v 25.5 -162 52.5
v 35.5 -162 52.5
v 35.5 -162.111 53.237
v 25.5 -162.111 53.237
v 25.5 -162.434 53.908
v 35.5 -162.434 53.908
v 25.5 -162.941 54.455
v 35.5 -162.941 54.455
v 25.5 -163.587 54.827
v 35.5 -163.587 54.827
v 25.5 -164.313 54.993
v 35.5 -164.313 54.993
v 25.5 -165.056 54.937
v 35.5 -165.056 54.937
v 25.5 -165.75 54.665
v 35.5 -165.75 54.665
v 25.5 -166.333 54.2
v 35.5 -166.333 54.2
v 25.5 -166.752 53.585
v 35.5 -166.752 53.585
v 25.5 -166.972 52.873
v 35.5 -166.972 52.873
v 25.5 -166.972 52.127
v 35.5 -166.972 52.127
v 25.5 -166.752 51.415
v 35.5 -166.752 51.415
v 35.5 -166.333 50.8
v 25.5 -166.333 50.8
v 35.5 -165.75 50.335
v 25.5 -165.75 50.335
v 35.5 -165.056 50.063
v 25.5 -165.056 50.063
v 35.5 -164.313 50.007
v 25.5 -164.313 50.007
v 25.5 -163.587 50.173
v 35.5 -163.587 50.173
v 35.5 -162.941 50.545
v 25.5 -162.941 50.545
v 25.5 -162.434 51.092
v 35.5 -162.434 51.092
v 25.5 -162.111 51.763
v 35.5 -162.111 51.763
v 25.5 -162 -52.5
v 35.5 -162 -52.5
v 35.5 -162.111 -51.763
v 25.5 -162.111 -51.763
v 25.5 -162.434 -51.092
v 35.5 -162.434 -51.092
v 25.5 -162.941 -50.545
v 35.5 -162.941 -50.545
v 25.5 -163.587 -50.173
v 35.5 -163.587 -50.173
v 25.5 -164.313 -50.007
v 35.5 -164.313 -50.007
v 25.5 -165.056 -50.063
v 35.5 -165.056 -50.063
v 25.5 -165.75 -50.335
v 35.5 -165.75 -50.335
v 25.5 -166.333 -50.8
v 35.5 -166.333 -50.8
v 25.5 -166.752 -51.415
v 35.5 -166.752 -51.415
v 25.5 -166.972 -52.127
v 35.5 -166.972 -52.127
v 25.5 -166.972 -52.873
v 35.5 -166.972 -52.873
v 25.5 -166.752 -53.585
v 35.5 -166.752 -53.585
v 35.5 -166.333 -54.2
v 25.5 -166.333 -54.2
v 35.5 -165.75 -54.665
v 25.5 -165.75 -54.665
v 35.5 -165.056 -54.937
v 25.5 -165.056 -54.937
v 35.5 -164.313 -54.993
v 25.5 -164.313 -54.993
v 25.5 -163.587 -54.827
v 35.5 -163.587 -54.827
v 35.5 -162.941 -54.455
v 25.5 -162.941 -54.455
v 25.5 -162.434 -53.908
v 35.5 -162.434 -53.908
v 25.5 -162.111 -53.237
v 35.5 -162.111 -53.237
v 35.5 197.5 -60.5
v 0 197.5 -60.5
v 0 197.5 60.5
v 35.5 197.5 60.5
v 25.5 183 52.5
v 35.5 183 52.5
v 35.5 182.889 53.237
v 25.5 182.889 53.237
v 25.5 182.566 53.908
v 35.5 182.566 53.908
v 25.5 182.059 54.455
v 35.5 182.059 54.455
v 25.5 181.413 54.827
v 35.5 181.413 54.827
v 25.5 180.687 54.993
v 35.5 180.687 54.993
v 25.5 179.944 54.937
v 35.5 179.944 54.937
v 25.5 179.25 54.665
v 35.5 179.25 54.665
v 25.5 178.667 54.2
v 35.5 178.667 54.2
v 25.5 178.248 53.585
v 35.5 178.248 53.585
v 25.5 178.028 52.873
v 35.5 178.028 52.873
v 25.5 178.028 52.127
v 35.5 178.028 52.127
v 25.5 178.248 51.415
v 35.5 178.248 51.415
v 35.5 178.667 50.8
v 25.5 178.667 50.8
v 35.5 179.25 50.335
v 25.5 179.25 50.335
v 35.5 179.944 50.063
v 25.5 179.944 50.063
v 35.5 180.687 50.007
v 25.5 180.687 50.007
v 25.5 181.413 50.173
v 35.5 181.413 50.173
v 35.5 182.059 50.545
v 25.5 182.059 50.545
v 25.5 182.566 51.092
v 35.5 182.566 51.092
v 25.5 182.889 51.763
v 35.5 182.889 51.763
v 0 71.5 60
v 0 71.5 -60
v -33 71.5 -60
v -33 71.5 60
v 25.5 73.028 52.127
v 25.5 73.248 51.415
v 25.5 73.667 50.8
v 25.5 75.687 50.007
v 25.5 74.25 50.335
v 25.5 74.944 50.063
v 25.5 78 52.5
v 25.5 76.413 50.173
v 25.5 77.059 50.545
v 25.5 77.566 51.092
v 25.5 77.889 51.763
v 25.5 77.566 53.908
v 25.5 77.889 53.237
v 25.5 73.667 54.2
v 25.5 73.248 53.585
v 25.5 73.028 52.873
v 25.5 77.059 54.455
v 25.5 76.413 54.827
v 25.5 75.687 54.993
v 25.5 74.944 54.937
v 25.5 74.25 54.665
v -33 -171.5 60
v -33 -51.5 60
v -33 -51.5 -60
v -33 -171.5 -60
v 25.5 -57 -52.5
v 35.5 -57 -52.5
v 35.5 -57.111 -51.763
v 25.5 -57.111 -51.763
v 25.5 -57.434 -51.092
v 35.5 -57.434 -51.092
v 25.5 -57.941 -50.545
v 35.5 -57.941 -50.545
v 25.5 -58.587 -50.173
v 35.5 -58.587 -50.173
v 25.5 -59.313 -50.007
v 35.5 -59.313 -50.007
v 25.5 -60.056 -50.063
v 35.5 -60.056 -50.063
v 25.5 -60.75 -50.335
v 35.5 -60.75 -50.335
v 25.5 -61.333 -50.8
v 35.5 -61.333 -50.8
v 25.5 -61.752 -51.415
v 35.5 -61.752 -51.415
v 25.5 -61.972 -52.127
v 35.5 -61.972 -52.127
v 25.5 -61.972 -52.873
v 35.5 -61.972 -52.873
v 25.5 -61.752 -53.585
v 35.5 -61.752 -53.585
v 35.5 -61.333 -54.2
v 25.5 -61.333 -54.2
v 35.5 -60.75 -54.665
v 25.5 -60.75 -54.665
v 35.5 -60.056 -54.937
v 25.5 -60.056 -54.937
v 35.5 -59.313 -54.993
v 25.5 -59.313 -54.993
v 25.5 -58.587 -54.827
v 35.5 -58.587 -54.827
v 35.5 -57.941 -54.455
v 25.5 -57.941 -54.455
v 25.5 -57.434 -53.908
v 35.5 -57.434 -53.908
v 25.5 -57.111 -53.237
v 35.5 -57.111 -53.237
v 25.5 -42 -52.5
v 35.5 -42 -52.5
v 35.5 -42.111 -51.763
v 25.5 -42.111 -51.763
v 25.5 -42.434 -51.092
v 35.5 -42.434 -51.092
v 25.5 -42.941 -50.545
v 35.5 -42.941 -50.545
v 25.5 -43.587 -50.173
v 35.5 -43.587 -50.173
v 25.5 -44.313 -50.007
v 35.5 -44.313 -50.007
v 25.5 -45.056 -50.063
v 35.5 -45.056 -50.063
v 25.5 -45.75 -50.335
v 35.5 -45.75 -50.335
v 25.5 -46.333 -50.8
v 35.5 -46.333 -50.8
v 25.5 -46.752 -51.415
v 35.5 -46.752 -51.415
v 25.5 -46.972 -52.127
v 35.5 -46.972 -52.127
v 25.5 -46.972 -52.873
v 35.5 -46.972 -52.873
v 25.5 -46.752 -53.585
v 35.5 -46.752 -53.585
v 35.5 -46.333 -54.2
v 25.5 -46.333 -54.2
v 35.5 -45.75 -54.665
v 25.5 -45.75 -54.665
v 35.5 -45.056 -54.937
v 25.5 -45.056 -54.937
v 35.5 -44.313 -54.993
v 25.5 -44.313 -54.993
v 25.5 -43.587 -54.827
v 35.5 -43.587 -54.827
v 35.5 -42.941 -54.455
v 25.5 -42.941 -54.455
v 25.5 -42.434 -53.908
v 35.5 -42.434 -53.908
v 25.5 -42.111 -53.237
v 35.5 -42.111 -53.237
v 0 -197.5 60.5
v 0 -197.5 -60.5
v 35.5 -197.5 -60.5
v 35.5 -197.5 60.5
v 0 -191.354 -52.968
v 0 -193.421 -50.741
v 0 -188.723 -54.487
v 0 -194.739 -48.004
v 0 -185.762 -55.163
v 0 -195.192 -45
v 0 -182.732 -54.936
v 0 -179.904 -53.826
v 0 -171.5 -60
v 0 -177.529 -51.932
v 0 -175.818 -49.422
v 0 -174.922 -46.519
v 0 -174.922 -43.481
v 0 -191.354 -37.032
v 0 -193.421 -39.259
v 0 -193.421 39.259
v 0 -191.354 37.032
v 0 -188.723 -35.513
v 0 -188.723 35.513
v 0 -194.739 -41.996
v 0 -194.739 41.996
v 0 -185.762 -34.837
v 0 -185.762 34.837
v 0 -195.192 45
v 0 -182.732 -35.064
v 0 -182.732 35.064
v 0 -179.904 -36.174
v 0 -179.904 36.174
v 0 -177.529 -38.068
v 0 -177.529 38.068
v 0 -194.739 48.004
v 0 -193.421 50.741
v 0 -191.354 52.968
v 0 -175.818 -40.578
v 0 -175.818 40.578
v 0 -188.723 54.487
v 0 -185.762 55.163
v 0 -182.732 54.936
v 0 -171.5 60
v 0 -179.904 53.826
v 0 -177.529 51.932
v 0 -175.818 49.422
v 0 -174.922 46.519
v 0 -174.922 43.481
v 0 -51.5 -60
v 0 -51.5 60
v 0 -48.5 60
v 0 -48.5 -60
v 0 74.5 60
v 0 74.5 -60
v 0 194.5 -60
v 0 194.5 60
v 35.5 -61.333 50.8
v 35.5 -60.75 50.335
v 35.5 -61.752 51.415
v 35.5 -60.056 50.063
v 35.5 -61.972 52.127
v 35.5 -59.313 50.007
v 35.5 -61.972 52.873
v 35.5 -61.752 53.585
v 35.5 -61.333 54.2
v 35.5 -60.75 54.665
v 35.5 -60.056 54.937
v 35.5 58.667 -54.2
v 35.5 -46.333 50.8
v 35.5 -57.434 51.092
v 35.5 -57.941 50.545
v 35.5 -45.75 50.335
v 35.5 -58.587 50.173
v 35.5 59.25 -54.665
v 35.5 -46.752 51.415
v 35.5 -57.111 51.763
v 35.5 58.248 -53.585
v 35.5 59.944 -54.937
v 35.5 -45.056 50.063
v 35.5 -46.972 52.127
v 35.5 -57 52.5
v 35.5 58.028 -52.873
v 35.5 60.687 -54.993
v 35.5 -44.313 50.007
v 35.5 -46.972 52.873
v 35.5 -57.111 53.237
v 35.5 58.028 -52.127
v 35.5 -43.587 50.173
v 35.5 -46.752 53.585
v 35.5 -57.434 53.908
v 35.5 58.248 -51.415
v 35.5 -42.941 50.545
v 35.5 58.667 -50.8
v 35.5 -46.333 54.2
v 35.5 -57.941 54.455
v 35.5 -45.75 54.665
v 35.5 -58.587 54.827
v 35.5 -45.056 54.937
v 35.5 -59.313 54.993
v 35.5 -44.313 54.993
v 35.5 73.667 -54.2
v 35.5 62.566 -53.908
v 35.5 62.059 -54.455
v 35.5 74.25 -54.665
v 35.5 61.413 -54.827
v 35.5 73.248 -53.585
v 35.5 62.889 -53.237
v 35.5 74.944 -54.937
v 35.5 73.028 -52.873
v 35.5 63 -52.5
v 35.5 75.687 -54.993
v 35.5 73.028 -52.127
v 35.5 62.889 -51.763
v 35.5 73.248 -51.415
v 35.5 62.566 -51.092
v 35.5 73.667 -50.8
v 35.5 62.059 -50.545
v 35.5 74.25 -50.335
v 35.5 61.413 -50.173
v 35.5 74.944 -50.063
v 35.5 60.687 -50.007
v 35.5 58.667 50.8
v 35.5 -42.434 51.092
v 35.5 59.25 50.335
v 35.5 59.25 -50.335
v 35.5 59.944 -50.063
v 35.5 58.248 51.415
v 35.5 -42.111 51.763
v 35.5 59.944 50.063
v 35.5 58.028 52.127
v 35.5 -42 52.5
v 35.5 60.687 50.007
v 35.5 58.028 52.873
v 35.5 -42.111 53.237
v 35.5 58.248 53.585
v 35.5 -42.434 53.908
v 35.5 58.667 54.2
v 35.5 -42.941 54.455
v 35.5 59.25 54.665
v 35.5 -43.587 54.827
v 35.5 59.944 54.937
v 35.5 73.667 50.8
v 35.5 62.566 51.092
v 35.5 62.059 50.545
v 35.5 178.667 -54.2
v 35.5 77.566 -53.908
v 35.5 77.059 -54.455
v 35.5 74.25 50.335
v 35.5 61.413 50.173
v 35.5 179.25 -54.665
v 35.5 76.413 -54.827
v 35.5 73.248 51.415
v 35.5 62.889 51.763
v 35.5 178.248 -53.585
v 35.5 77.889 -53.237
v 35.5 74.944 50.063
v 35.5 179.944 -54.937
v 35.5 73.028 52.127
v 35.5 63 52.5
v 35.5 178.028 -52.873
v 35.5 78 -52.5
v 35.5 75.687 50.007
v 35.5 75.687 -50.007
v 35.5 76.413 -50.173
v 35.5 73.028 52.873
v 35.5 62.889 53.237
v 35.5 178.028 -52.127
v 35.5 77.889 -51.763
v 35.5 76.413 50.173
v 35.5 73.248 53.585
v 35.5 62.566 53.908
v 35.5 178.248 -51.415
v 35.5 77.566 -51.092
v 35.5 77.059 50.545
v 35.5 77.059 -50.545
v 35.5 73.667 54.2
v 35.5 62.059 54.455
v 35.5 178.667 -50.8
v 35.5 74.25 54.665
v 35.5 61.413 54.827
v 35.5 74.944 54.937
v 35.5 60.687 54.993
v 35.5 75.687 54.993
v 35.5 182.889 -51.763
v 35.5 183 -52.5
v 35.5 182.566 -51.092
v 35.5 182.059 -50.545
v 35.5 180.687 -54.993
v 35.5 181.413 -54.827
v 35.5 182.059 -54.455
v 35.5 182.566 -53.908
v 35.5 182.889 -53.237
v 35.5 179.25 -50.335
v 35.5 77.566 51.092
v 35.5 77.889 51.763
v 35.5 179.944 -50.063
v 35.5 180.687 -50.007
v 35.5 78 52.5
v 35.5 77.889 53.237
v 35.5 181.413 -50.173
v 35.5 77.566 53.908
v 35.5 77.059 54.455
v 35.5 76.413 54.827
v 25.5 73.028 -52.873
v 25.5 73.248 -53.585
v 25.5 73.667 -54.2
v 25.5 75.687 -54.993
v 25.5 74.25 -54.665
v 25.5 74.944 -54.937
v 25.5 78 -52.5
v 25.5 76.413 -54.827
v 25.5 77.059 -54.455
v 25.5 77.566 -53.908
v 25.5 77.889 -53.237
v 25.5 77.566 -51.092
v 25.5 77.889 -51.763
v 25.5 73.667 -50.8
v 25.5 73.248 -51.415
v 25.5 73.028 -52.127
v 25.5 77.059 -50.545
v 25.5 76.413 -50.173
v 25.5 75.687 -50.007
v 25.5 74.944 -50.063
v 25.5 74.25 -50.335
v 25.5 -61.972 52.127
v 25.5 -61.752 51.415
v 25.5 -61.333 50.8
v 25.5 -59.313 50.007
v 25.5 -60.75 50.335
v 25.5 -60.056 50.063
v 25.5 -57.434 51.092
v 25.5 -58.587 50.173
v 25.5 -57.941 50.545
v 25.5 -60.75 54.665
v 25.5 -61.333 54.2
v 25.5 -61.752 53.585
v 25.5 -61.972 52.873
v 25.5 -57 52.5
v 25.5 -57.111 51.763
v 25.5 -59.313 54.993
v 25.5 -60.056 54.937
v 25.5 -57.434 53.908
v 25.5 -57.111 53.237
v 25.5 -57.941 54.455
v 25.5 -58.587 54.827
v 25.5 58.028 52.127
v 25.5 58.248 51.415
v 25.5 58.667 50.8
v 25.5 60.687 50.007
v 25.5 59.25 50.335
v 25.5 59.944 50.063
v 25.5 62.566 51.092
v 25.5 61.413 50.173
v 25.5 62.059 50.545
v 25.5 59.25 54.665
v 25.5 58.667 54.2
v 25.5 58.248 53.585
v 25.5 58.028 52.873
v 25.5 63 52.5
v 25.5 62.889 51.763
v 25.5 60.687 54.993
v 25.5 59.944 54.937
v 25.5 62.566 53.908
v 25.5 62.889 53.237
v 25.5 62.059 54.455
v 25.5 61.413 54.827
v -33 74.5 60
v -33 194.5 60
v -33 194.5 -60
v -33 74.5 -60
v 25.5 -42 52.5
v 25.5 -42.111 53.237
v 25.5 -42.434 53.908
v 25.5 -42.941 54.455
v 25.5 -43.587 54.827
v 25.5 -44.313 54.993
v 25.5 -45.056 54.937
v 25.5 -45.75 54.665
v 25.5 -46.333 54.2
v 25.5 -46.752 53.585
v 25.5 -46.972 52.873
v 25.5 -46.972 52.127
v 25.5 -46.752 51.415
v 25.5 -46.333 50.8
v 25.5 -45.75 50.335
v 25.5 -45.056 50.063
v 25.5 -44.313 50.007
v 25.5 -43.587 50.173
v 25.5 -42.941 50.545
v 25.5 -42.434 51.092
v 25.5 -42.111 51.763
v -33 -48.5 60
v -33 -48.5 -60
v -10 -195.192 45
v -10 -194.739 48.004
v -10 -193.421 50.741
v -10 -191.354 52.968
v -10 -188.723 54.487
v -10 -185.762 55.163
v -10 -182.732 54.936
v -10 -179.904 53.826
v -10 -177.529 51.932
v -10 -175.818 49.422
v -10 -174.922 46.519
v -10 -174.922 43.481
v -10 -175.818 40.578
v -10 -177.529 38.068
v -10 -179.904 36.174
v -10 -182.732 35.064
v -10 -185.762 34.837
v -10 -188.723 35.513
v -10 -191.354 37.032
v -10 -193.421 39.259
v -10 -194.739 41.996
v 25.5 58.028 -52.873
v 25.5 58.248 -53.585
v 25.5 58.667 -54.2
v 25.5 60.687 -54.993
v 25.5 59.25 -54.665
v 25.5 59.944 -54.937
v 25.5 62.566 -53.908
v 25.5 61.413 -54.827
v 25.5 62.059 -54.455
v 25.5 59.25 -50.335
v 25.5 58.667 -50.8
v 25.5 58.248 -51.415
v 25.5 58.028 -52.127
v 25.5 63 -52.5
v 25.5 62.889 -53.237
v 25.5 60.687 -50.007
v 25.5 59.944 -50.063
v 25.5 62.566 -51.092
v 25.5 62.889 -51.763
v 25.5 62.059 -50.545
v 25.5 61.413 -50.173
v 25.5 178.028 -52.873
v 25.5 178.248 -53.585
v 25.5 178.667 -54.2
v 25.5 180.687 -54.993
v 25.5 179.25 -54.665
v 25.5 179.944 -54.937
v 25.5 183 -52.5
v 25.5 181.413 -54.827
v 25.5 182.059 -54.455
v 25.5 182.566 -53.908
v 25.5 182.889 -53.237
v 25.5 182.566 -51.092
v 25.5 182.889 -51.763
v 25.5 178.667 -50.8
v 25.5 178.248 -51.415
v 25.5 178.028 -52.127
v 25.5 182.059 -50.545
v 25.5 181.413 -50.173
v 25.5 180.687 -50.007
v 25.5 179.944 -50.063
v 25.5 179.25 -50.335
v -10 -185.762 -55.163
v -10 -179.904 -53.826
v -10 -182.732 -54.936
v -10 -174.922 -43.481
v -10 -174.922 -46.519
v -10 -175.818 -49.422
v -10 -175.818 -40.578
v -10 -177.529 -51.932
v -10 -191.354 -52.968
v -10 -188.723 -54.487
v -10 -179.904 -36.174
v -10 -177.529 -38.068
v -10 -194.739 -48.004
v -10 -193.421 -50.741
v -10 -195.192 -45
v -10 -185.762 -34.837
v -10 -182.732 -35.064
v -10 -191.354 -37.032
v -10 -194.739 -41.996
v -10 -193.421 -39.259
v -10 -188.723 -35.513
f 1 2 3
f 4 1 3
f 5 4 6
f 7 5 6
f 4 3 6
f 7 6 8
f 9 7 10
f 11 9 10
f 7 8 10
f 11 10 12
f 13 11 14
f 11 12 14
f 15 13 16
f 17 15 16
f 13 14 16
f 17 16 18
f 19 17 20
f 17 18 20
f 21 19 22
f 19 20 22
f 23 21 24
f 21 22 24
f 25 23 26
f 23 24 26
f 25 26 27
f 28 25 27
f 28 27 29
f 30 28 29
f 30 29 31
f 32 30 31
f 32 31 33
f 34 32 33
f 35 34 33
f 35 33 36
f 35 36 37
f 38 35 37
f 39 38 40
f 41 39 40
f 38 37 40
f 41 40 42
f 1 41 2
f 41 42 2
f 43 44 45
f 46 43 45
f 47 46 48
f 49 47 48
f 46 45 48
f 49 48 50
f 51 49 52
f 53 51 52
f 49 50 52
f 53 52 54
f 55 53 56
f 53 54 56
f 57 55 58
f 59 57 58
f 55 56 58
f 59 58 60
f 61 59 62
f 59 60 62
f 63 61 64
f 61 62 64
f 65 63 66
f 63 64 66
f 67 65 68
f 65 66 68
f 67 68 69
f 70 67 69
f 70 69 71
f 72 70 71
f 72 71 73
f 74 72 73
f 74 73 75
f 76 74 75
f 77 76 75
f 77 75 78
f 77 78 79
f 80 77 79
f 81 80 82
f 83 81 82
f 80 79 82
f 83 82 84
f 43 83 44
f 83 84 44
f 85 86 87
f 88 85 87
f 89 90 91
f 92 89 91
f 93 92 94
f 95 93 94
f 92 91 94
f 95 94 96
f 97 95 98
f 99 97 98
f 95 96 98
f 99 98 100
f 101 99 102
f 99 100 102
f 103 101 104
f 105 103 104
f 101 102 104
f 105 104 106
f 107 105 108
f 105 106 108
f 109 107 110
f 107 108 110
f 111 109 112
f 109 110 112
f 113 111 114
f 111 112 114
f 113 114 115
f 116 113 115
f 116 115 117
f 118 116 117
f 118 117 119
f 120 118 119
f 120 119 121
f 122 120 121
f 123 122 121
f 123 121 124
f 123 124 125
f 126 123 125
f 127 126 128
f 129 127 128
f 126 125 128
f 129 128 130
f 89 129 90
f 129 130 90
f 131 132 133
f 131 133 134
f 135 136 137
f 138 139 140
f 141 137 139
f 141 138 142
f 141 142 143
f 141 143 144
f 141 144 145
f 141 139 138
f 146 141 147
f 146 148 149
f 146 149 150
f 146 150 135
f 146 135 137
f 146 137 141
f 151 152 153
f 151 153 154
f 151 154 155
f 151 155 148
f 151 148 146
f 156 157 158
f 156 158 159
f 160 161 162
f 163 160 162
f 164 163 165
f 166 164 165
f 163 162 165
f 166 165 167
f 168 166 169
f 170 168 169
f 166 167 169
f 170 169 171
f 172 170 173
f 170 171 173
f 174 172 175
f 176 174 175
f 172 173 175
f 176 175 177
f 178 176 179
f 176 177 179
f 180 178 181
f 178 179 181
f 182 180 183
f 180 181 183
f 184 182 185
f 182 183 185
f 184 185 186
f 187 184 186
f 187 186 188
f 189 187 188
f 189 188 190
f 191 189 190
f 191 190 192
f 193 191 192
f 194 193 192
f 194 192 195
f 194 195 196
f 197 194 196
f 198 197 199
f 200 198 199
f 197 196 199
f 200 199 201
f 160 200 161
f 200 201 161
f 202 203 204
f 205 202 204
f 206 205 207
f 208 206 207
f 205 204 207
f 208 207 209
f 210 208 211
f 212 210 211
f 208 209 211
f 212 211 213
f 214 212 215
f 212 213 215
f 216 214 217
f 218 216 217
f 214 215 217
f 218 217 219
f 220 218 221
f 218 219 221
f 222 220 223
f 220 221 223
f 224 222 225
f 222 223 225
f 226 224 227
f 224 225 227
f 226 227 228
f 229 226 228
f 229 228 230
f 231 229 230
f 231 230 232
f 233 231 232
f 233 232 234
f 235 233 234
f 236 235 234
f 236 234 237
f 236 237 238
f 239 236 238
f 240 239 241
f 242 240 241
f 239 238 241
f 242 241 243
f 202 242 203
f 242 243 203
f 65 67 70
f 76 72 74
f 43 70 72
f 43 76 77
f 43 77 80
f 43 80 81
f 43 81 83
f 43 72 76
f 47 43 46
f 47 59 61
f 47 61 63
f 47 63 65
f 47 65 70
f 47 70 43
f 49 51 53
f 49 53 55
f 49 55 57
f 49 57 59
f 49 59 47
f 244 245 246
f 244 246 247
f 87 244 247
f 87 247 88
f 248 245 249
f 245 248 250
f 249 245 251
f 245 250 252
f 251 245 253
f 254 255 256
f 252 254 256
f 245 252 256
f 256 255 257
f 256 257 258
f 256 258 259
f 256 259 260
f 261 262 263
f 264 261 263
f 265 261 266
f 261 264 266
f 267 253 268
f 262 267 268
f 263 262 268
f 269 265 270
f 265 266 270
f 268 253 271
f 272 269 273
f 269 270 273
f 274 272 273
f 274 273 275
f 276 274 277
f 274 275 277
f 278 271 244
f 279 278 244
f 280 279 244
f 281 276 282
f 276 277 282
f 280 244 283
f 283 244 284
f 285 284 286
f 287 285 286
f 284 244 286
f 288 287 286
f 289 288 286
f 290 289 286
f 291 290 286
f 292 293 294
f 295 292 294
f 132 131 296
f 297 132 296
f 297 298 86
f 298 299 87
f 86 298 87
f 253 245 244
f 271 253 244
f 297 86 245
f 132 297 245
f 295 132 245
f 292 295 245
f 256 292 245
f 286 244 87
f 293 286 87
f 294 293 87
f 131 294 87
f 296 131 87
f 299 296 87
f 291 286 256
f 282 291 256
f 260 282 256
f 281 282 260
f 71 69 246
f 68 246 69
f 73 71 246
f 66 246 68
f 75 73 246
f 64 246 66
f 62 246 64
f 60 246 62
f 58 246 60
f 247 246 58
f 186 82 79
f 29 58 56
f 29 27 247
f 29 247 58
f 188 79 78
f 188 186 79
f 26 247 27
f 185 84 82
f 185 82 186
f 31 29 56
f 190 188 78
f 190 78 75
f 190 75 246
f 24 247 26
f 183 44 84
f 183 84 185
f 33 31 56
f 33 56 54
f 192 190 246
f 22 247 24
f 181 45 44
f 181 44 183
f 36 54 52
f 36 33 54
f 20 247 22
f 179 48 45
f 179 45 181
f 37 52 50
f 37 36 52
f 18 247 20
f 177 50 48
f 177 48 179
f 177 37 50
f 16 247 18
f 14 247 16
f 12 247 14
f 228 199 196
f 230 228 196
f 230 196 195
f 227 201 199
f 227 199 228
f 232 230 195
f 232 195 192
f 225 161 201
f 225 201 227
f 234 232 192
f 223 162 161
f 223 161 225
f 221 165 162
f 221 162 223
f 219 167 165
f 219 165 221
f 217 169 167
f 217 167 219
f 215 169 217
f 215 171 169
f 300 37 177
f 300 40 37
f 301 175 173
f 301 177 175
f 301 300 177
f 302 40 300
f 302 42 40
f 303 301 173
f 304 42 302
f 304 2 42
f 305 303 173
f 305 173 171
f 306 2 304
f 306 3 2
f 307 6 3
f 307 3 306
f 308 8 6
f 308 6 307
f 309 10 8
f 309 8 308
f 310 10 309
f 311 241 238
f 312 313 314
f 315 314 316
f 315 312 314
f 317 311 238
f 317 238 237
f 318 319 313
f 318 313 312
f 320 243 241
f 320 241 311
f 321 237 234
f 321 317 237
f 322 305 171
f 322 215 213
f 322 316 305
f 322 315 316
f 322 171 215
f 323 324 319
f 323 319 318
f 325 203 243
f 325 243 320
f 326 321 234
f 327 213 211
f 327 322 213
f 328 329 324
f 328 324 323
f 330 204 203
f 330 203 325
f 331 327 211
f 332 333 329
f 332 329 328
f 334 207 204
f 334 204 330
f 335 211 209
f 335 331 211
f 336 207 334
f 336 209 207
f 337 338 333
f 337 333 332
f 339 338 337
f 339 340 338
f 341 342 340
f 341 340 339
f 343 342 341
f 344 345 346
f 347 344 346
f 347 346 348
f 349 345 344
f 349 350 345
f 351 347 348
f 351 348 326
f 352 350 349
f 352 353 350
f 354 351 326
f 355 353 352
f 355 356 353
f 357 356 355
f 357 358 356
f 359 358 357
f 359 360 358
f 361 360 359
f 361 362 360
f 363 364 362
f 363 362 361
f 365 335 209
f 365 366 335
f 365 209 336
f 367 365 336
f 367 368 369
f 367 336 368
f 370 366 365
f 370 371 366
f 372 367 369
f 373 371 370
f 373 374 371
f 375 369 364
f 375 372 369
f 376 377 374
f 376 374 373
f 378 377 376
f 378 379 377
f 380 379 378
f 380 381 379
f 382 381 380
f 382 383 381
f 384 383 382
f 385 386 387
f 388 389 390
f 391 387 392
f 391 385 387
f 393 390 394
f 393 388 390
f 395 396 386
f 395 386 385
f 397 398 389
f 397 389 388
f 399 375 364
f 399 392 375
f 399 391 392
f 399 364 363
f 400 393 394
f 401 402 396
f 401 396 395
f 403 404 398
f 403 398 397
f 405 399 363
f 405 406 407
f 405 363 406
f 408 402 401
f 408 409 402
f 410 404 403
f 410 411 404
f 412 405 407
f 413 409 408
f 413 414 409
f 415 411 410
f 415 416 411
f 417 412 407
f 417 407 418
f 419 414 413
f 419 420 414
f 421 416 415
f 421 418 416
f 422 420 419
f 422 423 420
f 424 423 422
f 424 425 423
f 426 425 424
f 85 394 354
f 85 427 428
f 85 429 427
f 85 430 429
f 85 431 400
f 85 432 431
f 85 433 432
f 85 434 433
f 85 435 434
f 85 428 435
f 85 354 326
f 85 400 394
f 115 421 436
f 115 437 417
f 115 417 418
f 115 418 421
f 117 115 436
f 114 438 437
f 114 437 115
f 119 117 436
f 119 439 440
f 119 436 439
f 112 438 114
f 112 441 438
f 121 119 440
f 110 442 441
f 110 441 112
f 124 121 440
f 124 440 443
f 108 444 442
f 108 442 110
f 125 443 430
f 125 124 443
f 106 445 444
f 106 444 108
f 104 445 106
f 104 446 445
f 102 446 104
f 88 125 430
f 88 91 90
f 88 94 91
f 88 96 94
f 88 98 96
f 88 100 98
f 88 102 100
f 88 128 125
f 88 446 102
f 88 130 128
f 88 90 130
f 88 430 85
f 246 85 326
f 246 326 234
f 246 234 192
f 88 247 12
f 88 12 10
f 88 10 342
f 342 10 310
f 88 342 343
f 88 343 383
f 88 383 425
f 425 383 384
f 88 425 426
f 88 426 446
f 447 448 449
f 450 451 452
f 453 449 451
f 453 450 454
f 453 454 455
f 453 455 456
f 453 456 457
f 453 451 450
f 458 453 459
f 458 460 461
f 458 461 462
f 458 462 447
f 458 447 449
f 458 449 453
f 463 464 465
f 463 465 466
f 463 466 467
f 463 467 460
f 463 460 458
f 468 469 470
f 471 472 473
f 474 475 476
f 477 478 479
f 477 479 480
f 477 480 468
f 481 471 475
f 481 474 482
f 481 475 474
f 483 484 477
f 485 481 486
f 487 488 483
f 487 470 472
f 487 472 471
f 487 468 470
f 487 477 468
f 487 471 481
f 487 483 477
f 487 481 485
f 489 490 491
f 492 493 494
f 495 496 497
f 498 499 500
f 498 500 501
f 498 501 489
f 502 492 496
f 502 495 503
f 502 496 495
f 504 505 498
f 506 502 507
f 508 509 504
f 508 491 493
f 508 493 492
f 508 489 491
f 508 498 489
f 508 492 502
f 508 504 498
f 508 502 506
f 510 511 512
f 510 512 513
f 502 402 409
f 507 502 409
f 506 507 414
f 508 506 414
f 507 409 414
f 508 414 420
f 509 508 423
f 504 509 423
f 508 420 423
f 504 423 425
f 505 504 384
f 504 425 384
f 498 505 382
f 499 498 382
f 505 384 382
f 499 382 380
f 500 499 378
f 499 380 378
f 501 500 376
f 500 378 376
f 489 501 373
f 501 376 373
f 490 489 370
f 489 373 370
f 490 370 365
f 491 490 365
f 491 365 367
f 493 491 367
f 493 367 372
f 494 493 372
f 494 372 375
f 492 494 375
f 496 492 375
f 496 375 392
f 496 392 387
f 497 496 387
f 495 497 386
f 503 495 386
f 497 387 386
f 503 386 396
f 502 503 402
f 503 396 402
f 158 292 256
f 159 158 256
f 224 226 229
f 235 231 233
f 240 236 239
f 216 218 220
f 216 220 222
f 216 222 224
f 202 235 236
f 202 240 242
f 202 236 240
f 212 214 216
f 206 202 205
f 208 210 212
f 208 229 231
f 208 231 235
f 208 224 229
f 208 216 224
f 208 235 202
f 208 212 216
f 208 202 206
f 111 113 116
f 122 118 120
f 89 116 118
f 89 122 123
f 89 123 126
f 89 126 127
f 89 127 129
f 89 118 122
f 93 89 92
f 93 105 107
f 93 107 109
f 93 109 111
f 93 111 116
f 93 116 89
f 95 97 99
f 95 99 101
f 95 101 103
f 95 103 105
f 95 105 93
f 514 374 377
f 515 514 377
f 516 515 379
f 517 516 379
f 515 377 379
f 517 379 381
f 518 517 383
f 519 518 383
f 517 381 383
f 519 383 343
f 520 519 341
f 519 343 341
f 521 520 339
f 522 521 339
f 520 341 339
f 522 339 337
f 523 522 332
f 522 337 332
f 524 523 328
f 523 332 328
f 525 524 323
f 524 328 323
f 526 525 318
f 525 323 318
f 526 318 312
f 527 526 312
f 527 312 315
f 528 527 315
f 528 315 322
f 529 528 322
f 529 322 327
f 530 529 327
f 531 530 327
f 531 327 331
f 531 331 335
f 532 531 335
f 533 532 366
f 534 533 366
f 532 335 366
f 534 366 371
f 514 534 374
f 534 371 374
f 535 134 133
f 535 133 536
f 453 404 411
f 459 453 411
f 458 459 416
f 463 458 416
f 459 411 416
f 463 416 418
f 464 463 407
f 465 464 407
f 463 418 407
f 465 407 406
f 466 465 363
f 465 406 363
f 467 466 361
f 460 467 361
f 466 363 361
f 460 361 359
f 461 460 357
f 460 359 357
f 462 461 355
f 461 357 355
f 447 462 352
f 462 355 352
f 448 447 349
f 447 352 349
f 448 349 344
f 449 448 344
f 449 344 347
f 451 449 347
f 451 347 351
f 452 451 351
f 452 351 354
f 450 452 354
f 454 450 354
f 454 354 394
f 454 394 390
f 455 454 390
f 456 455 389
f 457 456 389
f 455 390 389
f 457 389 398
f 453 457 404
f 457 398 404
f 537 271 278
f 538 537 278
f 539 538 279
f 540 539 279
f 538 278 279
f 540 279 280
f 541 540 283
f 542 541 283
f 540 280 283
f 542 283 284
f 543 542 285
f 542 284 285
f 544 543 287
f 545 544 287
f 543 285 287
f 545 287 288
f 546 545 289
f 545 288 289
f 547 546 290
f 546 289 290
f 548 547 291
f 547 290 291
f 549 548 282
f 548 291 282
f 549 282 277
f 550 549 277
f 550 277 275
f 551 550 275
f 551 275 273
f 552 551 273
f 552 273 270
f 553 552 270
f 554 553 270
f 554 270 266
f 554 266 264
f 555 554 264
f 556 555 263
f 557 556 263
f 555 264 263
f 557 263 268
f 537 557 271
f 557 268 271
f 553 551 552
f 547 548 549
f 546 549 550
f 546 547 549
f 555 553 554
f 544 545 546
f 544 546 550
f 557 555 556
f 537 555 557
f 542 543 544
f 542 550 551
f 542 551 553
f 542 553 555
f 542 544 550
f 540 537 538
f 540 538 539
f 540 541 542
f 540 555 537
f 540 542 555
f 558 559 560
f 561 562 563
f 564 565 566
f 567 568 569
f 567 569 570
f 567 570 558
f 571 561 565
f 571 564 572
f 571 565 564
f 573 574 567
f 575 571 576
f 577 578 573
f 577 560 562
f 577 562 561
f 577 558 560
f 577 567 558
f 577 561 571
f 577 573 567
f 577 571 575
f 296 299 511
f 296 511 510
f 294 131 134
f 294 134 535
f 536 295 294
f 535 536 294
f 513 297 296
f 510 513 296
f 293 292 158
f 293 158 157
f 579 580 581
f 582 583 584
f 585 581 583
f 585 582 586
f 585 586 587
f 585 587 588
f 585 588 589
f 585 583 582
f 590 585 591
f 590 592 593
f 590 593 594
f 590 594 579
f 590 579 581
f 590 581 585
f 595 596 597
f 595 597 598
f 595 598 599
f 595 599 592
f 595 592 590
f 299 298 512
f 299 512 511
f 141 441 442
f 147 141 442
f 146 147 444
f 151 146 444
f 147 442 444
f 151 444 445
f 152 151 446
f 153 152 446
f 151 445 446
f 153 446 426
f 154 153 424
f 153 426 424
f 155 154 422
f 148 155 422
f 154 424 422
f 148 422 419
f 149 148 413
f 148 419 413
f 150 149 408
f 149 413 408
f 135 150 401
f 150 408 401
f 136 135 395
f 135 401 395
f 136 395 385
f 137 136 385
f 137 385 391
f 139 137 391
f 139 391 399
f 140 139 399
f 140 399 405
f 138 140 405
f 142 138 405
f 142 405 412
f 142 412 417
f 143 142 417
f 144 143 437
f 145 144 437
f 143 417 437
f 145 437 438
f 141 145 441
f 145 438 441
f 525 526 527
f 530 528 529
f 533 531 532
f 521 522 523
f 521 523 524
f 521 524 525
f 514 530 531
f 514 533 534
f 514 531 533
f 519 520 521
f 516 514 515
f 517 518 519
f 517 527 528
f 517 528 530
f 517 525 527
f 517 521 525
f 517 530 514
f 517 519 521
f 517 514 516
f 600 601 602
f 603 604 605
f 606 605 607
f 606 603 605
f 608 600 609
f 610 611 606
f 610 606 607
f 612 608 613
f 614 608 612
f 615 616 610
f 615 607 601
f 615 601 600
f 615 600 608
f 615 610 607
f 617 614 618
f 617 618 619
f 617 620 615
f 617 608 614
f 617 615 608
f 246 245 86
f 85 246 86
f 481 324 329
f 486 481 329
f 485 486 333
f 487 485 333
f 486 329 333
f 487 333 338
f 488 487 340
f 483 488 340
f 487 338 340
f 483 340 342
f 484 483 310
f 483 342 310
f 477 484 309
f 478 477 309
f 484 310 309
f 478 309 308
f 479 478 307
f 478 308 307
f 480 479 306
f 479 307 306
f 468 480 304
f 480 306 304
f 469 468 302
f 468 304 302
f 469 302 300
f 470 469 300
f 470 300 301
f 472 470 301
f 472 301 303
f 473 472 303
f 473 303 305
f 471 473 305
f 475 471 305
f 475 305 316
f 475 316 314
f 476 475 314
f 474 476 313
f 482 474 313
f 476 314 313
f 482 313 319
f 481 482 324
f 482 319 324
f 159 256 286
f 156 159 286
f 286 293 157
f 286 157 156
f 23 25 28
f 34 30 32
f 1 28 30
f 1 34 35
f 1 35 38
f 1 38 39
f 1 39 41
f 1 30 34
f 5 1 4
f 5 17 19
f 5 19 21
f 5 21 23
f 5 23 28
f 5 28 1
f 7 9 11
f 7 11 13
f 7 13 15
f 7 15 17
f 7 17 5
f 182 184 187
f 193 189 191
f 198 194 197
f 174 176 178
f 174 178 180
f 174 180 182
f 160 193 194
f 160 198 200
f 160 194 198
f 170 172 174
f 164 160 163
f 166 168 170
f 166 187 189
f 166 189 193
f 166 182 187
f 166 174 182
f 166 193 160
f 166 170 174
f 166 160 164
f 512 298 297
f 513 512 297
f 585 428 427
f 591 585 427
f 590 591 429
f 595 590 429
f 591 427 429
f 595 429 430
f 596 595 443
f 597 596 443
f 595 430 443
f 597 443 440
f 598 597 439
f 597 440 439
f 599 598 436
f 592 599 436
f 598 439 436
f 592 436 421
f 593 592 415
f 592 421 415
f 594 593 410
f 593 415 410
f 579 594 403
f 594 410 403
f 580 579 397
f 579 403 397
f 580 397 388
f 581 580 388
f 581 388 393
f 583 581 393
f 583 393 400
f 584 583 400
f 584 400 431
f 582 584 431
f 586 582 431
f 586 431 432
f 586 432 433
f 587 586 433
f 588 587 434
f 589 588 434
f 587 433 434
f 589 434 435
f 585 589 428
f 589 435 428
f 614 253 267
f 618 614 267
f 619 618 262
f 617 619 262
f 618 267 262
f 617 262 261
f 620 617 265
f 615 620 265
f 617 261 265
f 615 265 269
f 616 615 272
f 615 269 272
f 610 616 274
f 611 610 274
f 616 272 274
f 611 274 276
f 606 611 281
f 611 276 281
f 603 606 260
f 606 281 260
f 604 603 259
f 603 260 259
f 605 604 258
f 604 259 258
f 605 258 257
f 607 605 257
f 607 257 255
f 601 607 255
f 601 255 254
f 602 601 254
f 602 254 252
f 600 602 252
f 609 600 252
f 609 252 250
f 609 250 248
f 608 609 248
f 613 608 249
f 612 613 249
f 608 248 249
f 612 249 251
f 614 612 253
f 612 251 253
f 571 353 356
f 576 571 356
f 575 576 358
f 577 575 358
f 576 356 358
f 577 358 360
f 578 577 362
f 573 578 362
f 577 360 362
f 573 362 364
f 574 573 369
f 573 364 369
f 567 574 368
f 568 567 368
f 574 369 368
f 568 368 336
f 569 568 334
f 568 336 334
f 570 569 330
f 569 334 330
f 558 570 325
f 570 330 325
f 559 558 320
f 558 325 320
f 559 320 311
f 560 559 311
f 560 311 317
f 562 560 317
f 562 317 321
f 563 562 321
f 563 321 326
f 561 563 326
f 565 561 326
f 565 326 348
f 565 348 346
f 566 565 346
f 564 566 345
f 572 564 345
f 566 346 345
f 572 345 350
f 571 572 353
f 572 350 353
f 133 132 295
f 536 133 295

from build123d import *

# Parameters (mm, degrees)
F0_W     = 395
F0_H     = 121
F1_DEPTH = 35.5
F2_W     = 120
F2_H     = 120
F3_DEPTH = 33
F4_R     = 10.191795
F5_DEPTH = 10
F6_R     = 2.5
F7_DEPTH = 10


with BuildPart() as f1:
    # F0 (on Right) → F1 (new body)
    with BuildSketch(Plane.YZ):
        Rectangle(F0_W, F0_H)
    extrude(amount=F1_DEPTH)

    # F2 (on face) → F3 (join)
    with BuildSketch(Plane(origin=(0, 0, 0), x_dir=(0, -1, 0), z_dir=(-1, 0, 0))):
        with Locations((-134.5, 0)):
            Rectangle(F2_W, F2_H)
        with Locations((-11.5, 0)):
            Rectangle(F2_W, F2_H)
        with Locations((111.5, 0)):
            Rectangle(F2_W, F2_H)
    extrude(amount=F3_DEPTH)

    # F4 (on face) → F5 (join)
    with BuildSketch(Plane(origin=(0, 0, 0), x_dir=(0, -1, 0), z_dir=(-1, 0, 0))):
        with Locations((185, 45)):
            Circle(F4_R)
        with Locations((185, -45)):
            Circle(F4_R)
    extrude(amount=F5_DEPTH)

    # F6 (on face) → F7 (cut)
    with BuildSketch(Plane.YZ.offset(35.5)):
        with Locations((180.5, -52.5)):
            Circle(F6_R)
        with Locations((75.5, -52.5)):
            Circle(F6_R)
        with Locations((60.5, -52.5)):
            Circle(F6_R)
        with Locations((180.5, 52.5)):
            Circle(F6_R)
        with Locations((75.5, 52.5)):
            Circle(F6_R)
        with Locations((60.5, 52.5)):
            Circle(F6_R)
        with Locations((-44.5, 52.5)):
            Circle(F6_R)
        with Locations((-59.5, 52.5)):
            Circle(F6_R)
        with Locations((-164.5, 52.5)):
            Circle(F6_R)
        with Locations((-44.5, -52.5)):
            Circle(F6_R)
        with Locations((-164.5, -52.5)):
            Circle(F6_R)
        with Locations((-59.5, -52.5)):
            Circle(F6_R)
    extrude(amount=-F7_DEPTH, mode=Mode.SUBTRACT)


solid = f1.part
